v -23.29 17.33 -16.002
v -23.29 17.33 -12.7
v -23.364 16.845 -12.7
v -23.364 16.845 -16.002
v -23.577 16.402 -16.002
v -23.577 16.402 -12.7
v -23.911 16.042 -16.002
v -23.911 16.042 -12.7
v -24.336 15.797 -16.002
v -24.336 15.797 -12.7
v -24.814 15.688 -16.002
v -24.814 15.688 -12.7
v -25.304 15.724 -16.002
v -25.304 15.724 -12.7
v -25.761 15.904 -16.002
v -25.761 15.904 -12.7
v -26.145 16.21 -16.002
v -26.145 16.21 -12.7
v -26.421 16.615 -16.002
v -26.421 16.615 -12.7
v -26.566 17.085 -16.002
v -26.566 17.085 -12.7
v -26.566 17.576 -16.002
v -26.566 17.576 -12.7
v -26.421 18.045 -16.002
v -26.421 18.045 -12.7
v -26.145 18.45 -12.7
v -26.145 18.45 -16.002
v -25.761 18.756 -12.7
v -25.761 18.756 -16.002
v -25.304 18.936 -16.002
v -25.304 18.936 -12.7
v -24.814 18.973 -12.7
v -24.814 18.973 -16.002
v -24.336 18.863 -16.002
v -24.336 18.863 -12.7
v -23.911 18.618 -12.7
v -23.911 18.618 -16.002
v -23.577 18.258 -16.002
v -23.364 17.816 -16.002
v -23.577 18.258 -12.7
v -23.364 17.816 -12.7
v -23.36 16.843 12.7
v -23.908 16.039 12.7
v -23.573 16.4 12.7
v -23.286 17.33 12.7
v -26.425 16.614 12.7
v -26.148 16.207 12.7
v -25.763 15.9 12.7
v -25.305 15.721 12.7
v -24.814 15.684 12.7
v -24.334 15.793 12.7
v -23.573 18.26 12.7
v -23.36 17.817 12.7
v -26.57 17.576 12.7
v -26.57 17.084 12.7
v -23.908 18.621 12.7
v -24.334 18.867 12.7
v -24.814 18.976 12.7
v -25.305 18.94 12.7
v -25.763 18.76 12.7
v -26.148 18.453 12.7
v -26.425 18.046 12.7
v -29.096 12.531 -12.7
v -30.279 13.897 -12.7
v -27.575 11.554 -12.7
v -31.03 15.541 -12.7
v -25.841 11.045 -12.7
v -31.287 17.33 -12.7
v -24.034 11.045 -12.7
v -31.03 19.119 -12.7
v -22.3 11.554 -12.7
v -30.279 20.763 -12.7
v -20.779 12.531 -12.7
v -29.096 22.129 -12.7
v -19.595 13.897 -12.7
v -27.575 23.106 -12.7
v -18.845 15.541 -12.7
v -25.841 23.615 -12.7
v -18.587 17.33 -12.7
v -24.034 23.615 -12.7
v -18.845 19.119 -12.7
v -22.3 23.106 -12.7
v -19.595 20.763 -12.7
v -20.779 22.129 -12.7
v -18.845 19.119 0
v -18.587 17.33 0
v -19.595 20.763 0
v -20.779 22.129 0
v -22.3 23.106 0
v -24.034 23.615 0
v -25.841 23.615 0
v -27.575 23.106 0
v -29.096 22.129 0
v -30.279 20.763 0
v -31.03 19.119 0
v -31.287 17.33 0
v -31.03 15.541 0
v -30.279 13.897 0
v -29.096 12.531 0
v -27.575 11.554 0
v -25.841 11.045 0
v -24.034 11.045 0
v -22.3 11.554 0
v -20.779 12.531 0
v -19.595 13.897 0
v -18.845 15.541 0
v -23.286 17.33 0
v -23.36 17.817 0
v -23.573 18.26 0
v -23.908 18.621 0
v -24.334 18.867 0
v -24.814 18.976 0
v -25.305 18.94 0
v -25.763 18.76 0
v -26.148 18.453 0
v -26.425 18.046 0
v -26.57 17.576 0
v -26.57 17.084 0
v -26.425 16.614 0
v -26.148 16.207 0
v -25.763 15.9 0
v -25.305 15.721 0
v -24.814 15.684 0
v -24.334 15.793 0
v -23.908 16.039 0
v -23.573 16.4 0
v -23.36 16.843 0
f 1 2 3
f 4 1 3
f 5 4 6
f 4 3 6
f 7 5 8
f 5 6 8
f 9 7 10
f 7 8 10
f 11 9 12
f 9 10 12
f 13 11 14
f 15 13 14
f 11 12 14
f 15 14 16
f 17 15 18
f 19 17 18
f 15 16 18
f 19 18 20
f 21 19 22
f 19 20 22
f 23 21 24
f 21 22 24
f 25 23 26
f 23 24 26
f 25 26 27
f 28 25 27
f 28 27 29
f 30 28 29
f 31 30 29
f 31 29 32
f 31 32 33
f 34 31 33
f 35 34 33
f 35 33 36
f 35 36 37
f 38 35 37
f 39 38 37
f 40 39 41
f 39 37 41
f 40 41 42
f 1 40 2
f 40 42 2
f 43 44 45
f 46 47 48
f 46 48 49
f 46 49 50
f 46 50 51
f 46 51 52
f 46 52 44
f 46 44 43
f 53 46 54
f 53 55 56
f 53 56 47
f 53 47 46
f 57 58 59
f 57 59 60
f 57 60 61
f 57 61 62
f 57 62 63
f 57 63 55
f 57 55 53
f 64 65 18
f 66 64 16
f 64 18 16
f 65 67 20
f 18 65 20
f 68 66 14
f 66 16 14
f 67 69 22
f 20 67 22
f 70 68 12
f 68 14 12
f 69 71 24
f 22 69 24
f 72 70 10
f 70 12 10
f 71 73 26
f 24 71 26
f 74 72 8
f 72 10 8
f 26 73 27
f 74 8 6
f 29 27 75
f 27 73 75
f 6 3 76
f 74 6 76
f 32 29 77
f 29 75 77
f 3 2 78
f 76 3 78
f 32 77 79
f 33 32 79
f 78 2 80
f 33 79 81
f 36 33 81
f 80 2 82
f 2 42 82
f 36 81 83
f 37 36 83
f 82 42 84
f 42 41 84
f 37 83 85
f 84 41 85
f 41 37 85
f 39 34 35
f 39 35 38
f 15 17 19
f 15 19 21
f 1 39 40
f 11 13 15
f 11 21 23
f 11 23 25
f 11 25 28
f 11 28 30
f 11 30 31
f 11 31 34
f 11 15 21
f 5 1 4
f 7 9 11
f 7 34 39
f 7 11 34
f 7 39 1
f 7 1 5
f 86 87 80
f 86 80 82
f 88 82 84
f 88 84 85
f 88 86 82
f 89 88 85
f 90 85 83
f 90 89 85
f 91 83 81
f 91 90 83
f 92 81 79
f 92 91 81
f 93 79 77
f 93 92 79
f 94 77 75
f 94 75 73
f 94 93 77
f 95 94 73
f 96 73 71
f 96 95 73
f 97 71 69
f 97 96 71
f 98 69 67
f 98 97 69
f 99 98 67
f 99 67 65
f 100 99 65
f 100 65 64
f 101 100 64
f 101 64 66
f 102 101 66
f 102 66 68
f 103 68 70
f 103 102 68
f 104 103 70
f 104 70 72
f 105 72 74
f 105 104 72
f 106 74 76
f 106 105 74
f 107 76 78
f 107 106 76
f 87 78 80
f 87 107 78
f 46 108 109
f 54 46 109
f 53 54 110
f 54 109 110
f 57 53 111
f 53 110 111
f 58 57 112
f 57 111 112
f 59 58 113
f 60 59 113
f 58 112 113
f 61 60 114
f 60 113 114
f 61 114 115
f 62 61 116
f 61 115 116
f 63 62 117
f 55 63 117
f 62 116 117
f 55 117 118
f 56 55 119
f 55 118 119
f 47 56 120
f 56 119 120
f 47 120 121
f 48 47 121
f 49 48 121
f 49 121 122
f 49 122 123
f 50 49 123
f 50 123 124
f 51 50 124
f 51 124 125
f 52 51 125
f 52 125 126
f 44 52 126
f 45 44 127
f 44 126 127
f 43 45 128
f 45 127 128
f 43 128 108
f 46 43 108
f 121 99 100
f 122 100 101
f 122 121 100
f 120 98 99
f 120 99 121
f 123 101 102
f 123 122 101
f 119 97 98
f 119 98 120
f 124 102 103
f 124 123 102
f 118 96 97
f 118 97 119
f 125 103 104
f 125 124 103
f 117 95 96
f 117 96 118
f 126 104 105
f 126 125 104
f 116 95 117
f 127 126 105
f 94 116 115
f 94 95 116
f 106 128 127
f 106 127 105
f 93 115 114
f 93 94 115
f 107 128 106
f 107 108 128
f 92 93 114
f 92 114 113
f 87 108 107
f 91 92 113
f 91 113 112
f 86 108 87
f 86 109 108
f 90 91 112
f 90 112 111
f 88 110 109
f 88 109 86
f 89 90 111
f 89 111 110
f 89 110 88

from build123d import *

# Parameters (mm, degrees)
F0_R     = 6.35
F1_DEPTH = 12.7
F2_R     = 1.651
F3_DEPTH = 12.7
F4_R     = 1.647045
F5_DEPTH = 3.302


with BuildPart() as f1:
    # F0 (on Top) → F1 (new body)
    with BuildSketch(Plane.XY):
        with Locations((-24.937442, 17.330116)):
            Circle(F0_R)
    extrude(amount=-F1_DEPTH)

    # F2 (on Top) → F3 (join)
    with BuildSketch(Plane.XY):
        with Locations((-24.937442, 17.330116)):
            Circle(F2_R)
    extrude(amount=F3_DEPTH)

    # F4 (on face) → F5 (join)
    with BuildSketch(Plane(origin=(0, 0, -12.7), x_dir=(1, 0, 0), z_dir=(0, 0, -1))):
        with Locations((-24.937442, -17.330116)):
            Circle(F4_R)
    extrude(amount=F5_DEPTH)


solid = f1.part
